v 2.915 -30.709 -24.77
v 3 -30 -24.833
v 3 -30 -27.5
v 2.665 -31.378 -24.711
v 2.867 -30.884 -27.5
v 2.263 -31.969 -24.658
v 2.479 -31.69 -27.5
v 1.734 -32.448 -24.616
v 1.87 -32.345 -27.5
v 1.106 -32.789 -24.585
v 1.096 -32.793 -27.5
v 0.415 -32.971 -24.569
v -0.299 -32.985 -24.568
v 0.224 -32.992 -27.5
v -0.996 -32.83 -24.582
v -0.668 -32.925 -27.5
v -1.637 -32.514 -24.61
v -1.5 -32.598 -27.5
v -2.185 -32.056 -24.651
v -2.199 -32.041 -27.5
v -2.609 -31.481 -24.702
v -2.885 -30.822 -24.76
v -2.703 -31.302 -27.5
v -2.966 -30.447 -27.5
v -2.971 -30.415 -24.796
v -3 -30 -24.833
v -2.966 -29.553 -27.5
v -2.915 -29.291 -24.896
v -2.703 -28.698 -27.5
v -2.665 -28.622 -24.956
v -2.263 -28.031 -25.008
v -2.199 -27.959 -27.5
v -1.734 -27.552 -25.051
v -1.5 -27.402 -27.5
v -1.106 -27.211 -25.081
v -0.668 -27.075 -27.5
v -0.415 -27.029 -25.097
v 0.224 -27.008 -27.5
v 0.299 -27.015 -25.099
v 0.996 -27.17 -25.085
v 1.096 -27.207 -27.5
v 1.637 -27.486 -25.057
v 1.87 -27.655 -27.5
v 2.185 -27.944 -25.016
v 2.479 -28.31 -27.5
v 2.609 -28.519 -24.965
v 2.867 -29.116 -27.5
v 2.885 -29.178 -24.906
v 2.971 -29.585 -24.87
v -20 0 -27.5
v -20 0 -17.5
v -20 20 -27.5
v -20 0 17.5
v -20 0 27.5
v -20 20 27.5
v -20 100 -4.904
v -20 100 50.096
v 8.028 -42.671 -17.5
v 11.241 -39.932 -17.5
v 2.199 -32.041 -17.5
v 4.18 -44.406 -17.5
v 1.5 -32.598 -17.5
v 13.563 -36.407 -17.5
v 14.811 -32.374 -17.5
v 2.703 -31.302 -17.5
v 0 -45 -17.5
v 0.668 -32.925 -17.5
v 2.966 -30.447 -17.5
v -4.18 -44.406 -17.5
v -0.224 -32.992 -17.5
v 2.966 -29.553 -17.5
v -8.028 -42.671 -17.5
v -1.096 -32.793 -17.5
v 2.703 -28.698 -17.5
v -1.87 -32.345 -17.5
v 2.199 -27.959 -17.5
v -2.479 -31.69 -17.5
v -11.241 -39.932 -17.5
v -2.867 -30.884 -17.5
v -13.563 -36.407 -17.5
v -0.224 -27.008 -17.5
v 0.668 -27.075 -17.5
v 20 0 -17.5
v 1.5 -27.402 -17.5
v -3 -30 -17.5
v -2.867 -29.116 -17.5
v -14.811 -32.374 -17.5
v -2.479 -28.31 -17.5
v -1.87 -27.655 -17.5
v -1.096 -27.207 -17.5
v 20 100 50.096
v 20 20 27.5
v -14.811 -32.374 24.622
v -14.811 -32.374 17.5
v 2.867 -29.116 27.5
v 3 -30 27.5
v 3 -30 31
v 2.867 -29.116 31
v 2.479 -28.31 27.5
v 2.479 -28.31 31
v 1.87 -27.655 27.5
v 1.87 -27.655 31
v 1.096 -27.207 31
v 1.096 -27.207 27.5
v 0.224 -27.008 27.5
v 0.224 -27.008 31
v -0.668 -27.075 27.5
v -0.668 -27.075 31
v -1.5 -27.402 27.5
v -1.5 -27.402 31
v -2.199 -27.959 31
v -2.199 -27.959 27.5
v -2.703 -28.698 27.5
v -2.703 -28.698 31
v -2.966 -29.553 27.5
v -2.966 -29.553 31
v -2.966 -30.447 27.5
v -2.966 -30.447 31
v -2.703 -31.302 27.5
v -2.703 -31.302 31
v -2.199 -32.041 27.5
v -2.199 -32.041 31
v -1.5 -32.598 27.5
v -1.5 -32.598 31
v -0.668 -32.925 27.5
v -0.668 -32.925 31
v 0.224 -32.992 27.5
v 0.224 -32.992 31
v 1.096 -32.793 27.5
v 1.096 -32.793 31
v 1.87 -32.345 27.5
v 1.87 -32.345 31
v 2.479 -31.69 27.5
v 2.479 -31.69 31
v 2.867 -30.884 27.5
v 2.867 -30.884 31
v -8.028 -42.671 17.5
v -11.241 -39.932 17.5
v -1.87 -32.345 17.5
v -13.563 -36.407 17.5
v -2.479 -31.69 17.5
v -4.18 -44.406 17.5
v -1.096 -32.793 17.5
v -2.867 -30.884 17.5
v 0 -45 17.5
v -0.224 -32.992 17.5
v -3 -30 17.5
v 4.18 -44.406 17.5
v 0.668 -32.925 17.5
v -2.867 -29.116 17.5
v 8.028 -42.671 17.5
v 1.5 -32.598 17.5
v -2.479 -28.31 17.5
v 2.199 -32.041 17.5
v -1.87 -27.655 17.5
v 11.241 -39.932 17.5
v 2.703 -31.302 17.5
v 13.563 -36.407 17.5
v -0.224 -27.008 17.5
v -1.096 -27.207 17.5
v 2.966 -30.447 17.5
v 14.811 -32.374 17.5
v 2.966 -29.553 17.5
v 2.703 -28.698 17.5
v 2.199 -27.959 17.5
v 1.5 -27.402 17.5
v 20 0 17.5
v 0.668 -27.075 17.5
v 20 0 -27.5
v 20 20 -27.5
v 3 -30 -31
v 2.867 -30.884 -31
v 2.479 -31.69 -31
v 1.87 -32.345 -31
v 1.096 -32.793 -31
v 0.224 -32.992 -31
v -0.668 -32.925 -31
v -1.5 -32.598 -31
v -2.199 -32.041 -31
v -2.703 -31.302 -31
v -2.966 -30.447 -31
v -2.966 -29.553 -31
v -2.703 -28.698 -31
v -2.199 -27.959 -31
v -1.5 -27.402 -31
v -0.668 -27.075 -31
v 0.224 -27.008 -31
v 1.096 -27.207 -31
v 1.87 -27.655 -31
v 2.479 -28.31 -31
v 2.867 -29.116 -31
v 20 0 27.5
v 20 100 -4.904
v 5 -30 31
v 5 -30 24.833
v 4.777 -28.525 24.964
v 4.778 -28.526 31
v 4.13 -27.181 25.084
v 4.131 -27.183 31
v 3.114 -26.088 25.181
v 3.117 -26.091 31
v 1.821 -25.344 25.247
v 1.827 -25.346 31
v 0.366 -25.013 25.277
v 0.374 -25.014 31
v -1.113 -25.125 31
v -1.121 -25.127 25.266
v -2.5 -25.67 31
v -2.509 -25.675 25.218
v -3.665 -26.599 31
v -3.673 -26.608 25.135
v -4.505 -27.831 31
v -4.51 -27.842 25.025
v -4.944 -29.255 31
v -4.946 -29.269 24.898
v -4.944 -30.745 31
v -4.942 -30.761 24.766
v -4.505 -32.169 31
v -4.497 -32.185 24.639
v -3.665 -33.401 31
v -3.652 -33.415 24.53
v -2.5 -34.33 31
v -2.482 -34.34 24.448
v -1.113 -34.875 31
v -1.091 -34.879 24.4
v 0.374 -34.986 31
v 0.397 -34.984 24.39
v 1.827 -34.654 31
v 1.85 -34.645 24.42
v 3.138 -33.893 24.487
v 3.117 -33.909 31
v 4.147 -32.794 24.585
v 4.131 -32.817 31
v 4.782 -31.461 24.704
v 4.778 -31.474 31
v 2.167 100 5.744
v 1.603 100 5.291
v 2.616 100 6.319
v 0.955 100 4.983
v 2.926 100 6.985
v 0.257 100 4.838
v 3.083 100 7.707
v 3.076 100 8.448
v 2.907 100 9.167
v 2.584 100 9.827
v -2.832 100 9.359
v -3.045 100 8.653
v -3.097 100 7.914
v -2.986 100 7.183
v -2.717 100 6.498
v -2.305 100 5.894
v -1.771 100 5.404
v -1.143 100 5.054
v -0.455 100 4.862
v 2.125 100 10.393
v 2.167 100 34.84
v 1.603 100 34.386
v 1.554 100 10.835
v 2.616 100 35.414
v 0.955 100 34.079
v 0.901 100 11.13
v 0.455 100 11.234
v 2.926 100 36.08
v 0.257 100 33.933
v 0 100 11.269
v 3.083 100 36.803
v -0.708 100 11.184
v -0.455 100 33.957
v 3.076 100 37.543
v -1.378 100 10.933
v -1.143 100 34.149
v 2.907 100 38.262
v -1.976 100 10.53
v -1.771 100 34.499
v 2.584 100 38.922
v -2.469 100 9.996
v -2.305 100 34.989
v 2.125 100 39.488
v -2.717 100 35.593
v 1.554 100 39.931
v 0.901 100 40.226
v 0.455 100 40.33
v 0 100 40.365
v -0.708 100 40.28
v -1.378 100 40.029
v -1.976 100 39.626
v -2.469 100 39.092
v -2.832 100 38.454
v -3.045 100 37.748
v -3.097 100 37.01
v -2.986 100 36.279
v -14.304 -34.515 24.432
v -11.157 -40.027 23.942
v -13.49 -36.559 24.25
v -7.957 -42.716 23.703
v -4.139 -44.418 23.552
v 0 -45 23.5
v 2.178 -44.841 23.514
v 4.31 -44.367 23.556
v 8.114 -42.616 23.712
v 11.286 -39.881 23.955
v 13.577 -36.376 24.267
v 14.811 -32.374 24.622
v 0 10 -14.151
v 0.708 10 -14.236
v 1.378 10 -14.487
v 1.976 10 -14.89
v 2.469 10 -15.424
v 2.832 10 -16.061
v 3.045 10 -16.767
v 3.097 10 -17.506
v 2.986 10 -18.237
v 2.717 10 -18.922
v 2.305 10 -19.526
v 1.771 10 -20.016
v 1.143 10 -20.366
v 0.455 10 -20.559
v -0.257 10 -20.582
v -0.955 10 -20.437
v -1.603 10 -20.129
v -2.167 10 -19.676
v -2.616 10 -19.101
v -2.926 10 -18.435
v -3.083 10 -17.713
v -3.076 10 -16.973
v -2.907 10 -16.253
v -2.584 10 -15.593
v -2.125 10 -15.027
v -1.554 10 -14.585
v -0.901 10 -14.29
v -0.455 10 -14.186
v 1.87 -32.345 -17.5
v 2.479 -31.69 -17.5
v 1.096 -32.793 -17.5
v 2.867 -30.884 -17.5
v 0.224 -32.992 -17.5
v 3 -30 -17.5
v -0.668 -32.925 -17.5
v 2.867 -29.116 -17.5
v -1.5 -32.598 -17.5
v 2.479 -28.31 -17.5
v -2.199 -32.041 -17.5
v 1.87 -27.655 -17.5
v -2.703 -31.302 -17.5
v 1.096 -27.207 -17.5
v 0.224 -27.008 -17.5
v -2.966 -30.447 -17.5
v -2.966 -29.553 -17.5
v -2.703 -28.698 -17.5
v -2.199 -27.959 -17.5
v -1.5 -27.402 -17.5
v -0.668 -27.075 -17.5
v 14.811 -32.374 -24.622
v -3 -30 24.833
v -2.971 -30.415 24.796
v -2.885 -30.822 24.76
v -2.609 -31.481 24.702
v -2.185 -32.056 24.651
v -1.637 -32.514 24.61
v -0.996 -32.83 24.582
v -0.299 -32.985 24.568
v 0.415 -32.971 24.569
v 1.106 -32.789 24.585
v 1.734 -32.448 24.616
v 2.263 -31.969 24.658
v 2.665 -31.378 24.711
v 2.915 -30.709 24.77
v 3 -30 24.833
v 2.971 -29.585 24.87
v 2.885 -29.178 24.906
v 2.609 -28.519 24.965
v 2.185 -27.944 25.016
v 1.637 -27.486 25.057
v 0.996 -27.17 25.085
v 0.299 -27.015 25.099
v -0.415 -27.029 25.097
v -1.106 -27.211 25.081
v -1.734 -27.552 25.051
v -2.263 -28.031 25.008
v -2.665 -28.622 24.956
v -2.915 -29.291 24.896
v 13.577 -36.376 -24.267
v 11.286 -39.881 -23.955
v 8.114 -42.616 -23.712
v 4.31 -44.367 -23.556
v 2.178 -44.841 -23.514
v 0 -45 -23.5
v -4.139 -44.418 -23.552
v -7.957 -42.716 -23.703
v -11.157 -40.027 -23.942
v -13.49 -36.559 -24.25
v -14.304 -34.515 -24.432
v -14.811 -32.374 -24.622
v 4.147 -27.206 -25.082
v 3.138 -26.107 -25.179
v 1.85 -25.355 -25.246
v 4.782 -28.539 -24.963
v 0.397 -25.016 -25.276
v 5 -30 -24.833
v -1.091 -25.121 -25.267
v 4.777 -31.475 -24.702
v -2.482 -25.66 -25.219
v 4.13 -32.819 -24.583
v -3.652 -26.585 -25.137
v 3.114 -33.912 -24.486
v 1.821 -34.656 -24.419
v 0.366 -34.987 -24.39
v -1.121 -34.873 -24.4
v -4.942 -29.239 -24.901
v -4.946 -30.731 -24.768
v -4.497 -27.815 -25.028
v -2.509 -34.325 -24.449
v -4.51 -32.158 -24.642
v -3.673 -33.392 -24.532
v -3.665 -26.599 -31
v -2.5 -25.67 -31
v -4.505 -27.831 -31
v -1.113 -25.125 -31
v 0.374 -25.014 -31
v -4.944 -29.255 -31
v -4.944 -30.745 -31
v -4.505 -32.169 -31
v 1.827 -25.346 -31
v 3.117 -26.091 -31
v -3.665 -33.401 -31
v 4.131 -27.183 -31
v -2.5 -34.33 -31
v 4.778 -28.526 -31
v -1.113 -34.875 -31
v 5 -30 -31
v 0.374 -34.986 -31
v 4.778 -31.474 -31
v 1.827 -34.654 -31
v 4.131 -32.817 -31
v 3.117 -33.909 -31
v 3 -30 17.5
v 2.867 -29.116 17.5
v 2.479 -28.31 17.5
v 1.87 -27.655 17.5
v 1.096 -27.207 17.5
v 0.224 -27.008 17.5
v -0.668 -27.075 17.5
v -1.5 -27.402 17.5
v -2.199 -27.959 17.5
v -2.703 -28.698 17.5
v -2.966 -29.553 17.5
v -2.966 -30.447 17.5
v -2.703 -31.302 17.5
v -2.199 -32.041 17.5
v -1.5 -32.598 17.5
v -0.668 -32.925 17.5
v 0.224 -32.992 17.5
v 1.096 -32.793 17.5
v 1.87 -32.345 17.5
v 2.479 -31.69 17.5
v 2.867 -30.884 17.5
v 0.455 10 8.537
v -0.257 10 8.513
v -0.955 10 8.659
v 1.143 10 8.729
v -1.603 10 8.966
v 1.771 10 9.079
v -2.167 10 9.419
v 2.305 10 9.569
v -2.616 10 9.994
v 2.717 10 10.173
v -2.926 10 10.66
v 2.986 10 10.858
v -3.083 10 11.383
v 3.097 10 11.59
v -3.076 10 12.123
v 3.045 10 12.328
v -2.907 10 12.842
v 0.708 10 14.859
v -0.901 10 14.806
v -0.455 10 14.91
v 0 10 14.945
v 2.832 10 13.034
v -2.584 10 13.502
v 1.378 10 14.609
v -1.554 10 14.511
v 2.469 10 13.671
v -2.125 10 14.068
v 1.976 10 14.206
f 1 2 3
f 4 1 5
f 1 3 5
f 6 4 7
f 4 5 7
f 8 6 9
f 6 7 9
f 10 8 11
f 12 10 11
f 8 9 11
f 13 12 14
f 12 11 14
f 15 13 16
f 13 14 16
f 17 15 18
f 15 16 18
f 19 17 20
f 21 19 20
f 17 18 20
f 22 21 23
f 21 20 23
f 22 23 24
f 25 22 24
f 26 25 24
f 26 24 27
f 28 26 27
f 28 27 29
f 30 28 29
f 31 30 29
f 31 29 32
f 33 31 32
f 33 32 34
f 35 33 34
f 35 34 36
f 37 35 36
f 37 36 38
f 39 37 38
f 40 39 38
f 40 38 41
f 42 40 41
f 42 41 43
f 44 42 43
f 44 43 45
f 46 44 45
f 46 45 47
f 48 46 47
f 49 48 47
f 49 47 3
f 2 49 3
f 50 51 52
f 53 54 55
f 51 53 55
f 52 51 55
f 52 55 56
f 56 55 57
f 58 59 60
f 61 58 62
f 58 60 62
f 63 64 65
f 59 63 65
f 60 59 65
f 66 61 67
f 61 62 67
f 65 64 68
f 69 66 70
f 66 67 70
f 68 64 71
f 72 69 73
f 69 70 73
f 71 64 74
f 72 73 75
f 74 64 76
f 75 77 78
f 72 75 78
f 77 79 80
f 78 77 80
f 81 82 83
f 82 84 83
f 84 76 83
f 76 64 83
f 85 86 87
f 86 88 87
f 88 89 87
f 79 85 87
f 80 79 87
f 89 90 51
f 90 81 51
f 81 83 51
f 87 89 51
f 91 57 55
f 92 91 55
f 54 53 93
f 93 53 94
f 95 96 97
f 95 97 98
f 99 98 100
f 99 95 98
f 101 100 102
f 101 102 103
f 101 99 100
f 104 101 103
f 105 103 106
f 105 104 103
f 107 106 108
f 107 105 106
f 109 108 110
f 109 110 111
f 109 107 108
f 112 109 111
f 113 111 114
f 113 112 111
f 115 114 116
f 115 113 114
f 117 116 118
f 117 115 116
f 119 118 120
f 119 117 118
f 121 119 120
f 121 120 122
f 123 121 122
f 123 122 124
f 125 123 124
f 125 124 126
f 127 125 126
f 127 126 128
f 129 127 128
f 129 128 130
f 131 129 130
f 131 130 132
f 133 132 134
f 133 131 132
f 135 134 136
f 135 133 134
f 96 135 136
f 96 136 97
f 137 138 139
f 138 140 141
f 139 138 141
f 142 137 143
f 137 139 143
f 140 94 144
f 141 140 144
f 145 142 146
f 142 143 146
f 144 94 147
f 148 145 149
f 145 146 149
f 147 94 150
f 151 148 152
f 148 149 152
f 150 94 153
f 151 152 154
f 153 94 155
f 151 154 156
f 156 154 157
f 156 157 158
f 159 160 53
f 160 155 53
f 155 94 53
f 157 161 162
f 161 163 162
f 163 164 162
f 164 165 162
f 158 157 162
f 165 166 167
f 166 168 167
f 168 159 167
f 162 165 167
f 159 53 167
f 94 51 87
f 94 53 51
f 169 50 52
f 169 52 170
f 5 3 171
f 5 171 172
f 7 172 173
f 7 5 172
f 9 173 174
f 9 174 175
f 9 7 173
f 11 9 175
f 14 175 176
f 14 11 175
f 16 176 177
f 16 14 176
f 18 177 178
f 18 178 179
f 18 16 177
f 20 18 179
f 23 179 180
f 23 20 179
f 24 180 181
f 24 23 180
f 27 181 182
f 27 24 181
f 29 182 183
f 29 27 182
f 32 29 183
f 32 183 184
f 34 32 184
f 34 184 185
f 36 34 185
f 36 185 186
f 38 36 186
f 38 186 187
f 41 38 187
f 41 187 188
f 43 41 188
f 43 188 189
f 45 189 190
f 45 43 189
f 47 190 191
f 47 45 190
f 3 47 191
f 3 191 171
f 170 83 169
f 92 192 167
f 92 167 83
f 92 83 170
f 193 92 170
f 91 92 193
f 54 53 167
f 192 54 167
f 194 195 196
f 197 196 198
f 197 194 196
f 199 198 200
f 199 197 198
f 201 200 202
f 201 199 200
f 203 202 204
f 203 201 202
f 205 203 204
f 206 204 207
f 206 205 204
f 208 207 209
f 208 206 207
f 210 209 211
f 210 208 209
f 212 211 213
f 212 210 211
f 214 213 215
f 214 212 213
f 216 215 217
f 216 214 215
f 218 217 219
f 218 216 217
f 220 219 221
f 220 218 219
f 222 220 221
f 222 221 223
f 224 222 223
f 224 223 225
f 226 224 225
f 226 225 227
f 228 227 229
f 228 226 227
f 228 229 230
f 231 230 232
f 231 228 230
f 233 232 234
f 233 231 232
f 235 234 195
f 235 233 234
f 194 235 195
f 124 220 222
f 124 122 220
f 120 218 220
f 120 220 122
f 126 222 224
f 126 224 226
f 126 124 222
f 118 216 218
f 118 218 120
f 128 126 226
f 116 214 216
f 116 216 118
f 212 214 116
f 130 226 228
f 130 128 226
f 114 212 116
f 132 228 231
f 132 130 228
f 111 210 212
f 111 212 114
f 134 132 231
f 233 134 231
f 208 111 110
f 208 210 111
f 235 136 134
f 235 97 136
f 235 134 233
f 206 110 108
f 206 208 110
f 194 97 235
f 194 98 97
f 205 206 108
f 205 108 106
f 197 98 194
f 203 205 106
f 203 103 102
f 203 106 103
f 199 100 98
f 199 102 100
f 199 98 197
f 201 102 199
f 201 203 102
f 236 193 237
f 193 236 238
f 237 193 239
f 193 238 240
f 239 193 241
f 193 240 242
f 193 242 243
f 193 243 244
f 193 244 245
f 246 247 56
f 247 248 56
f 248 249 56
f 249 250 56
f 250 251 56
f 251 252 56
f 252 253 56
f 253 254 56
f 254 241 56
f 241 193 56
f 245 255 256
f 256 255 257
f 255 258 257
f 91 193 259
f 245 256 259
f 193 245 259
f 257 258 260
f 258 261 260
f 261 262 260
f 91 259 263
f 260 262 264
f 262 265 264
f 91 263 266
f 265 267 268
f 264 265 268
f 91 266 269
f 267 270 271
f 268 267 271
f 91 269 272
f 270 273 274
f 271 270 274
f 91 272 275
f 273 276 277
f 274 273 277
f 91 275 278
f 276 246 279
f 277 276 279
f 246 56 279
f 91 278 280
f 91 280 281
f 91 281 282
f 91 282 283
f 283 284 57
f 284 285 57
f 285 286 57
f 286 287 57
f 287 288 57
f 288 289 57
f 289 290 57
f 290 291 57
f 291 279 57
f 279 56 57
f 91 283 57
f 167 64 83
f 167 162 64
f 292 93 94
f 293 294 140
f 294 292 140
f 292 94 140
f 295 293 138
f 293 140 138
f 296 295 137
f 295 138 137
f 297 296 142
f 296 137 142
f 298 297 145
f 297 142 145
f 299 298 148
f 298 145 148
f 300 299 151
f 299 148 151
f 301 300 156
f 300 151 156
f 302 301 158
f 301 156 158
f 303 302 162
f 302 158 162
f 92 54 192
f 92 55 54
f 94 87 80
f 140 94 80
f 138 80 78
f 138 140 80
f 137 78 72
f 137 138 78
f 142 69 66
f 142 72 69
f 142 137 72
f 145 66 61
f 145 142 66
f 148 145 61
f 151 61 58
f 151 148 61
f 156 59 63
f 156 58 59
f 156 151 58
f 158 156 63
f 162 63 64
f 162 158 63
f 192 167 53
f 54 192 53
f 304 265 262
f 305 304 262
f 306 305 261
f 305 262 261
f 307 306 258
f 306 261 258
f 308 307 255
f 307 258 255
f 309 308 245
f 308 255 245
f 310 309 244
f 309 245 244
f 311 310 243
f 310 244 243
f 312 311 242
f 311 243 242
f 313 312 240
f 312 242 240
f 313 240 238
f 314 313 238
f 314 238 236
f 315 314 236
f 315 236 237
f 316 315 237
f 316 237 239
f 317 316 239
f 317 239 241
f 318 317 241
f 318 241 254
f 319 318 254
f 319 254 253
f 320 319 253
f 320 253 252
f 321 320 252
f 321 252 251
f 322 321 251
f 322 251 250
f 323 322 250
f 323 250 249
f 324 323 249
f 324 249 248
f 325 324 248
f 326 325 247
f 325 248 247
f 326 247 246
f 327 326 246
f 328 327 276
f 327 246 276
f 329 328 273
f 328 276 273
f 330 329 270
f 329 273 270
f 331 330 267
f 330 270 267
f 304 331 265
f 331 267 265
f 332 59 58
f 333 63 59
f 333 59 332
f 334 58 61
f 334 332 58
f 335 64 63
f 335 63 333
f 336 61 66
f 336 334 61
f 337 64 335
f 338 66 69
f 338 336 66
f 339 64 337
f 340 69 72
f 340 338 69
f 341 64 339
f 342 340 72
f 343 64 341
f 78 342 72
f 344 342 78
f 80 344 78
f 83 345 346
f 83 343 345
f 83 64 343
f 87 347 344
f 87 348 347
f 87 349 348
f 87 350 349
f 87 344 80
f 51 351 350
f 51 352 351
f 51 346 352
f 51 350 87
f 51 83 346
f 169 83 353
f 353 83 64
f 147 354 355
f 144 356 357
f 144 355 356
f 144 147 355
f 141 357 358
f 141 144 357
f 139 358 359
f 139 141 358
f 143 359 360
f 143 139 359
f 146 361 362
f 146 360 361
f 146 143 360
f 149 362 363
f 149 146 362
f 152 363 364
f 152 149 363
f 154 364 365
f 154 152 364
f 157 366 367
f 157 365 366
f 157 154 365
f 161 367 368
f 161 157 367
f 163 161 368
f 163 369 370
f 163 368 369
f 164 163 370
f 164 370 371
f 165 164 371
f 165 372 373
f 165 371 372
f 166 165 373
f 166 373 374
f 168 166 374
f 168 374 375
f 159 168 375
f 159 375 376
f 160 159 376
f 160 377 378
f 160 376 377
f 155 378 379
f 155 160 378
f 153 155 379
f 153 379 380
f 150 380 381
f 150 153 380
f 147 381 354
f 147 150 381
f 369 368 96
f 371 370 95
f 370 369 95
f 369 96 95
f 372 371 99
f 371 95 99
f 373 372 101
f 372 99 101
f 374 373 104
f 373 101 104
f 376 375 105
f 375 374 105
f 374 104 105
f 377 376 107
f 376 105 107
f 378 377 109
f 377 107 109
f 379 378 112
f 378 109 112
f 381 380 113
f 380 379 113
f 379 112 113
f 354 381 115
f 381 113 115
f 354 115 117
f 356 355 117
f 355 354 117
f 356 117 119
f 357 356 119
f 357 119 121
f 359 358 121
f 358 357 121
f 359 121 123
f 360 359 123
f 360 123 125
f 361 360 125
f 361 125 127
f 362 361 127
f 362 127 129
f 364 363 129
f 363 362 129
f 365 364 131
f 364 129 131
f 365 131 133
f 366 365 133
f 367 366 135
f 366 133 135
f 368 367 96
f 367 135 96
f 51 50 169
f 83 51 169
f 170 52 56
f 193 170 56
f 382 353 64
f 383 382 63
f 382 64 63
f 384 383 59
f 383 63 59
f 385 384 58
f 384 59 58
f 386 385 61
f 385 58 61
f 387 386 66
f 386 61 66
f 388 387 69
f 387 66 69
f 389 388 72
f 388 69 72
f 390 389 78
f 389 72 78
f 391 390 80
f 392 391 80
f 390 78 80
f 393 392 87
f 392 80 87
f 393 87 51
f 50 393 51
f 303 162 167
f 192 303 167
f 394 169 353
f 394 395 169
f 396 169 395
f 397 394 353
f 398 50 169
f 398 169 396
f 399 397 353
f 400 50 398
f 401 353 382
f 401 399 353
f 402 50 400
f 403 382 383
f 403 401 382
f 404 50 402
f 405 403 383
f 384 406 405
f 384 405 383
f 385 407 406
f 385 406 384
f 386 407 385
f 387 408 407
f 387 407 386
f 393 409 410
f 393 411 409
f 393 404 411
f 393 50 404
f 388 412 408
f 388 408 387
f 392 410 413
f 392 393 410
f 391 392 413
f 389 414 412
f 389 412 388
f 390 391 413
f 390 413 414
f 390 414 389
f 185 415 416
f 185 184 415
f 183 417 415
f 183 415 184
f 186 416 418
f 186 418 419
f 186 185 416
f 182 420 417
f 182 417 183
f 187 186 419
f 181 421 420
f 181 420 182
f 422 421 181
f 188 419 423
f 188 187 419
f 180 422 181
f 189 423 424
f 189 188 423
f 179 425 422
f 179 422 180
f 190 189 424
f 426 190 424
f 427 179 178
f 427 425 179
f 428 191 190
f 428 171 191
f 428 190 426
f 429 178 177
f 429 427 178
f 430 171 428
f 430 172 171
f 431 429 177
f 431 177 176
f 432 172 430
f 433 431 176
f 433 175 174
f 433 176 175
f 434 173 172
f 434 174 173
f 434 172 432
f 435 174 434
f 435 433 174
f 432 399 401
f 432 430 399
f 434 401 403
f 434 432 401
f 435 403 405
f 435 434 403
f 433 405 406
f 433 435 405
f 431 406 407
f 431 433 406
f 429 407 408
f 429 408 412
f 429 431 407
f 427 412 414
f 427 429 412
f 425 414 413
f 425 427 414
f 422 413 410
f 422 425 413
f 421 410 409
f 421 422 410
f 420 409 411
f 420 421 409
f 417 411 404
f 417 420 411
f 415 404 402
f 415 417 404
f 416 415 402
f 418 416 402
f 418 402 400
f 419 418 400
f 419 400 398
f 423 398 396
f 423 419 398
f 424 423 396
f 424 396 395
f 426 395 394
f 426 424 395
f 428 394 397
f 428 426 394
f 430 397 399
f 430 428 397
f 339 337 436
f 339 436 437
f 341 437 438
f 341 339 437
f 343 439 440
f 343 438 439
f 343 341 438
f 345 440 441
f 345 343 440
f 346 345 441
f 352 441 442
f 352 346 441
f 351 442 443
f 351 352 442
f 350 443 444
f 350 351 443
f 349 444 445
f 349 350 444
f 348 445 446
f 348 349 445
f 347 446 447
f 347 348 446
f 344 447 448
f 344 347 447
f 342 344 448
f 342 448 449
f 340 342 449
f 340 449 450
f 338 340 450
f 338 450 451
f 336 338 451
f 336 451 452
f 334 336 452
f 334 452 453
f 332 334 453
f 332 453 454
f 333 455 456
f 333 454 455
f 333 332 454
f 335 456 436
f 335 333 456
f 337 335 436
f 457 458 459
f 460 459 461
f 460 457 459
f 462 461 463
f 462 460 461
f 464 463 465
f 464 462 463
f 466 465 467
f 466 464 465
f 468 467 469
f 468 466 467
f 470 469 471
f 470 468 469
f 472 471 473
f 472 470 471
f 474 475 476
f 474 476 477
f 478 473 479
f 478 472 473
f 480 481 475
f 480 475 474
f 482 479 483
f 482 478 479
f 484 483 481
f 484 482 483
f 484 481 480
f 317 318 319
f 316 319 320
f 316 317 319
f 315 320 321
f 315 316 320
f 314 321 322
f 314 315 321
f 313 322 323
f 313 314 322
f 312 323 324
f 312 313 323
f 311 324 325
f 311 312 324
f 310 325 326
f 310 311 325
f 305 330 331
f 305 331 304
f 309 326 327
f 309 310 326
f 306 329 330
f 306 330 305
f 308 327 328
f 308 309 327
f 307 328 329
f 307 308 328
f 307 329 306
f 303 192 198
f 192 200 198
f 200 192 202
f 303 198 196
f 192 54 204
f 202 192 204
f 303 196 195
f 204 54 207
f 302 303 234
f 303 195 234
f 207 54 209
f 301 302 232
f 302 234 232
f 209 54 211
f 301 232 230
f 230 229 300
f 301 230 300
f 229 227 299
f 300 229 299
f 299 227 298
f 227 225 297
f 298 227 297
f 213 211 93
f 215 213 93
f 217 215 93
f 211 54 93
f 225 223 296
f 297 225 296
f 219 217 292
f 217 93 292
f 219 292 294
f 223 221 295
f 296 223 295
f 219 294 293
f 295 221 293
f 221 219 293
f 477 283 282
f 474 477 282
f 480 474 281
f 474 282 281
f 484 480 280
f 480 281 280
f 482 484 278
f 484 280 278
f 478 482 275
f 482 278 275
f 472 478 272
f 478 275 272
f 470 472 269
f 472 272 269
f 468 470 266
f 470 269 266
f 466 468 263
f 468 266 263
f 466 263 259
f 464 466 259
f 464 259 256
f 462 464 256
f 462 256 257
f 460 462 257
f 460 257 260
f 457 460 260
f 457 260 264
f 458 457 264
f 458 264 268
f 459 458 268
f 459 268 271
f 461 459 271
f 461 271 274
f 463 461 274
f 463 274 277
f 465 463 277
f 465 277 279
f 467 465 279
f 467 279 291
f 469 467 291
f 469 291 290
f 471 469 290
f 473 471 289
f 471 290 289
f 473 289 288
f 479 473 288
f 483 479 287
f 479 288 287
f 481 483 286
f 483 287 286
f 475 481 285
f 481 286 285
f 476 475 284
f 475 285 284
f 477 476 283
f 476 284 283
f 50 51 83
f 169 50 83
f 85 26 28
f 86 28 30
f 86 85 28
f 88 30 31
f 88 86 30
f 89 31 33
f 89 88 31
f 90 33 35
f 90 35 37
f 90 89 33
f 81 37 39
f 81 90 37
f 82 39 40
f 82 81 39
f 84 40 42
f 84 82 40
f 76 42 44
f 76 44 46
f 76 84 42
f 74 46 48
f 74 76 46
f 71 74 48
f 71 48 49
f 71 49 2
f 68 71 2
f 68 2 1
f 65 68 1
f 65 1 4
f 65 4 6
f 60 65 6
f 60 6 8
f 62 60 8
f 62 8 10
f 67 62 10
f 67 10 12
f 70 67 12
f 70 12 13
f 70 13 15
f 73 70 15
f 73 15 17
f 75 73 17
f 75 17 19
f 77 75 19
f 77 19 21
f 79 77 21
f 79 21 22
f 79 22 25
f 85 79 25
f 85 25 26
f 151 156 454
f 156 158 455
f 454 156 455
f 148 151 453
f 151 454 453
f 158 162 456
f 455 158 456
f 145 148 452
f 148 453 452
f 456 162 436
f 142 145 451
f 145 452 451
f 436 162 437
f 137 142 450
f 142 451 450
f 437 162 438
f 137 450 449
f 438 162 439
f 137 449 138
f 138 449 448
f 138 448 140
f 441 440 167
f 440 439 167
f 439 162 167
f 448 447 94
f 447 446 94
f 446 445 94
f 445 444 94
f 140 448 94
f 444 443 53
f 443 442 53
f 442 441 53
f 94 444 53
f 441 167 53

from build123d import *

# Parameters (mm, degrees)
CROQUIS1_W                          = 40
CROQUIS1_H                          = 55
SALIENTE_EXTRUIR1_DEPTH             = 20
SALIENTE_EXTRUIR2_REACH             = 41.449
SALIENTE_EXTRUIR2_DIRECTION_2_REACH = 41.449
CORTAR_EXTRUIR6_DEPTH               = 57.402570863
CORTAR_EXTRUIR6_DEPTH_BACK          = 57.402570863
CROQUIS6_R                          = 3
CORTAR_EXTRUIR10_DEPTH              = 10
CROQUIS11_R                         = 3
SALIENTE_EXTRUIR3_DEPTH             = 10
CORTAR_EXTRUIR11_DEPTH              = 57.402570863
CORTAR_EXTRUIR11_DEPTH_BACK         = 57.402570863
CORTAR_EXTRUIR15_START              = -10
CORTAR_EXTRUIR15_DEPTH              = 10
CROQUIS17_R                         = 3
SALIENTE_EXTRUIR4_DEPTH             = 10
CORTAR_EXTRUIR16_DEPTH              = 57.402570863
CORTAR_EXTRUIR16_DEPTH_BACK         = 57.402570863
CROQUIS21_R                         = 5
CROQUIS21_R_2                       = 3
SALIENTE_EXTRUIR5_DEPTH             = 3.5
SALIENTE_EXTRUIR5_DIRECTION_2_REACH = 75.824
CROQUIS22_R                         = 5
CROQUIS22_R_2                       = 3
SALIENTE_EXTRUIR6_DEPTH             = 3.5
SALIENTE_EXTRUIR6_DIRECTION_2_REACH = 78.467
BARRER1_START                       = -20
BARRER1_DEPTH                       = 40
CORTAR_EXTRUIR20_REACH              = 165.765
CROQUIS25_R                         = 3.1


# Read off the part's stored shape, not the designer's step: Barrer1
with BuildPart() as part:
    # Croquis1 → Saliente-Extruir1 (new body)
    with BuildSketch(Plane(origin=(0, 0, 0), x_dir=(1, 0, 0), z_dir=(0, 1, 0))):
        Rectangle(CROQUIS1_W, CROQUIS1_H)
    extrude(amount=SALIENTE_EXTRUIR1_DEPTH)

    # Saliente-Extruir2: up to this face of the body (flat: up to its plane)
    saliente_extruir2_end = Plane(part.part.faces().sort_by_distance((0, 10, 27.5))[0])
    # Croquis5 → Saliente-Extruir2 (add, up to the picked face)
    with BuildSketch(Plane.XY, mode=Mode.PRIVATE) as saliente_extruir2_sk1:
        with BuildLine():
            Line((-20, 0), (-14.810951292, -32.373967528))
            ThreePointArc((-14.810951292, -32.373967528), (0, -45), (14.810951292, -32.373967528))
            Line((14.810951292, -32.373967528), (20, 0))
            Line((20, 0), (-20, 0))
        make_face()
    saliente_extruir2_tool1 = split(extrude(saliente_extruir2_sk1.sketch, amount=SALIENTE_EXTRUIR2_REACH, mode=Mode.PRIVATE), bisect_by=saliente_extruir2_end, keep=Keep.BOTH, mode=Mode.PRIVATE)
    add(saliente_extruir2_tool1.solids().sort_by(Axis((0, -19.849245, 0), (0, 0, 1)))[0])

    # Saliente-Extruir2 direction 2: up to this face of the body (flat: up to its plane)
    saliente_extruir2_direction_2_end = Plane(part.part.faces().sort_by_distance((0, 10, -27.5))[0])
    # Croquis5 → Saliente-Extruir2 direction 2 (add, up to the picked face)
    with BuildSketch(Plane.XY, mode=Mode.PRIVATE) as saliente_extruir2_direction_2_sk1:
        with BuildLine():
            Line((-20, 0), (-14.810951292, -32.373967528))
            ThreePointArc((-14.810951292, -32.373967528), (0, -45), (14.810951292, -32.373967528))
            Line((14.810951292, -32.373967528), (20, 0))
            Line((20, 0), (-20, 0))
        make_face()
    saliente_extruir2_direction_2_tool1 = split(extrude(saliente_extruir2_direction_2_sk1.sketch, amount=-SALIENTE_EXTRUIR2_DIRECTION_2_REACH, mode=Mode.PRIVATE), bisect_by=saliente_extruir2_direction_2_end, keep=Keep.BOTH, mode=Mode.PRIVATE)
    add(saliente_extruir2_direction_2_tool1.solids().sort_by(Axis((0, -19.849245, 0), (0, 0, -1)))[0])

    # Croquis6 → Cortar-Extruir6 (cut, two sides: drawn at the far end of the back side and taken through both)
    with BuildSketch(Plane.XY.offset(-CORTAR_EXTRUIR6_DEPTH_BACK)):
        with Locations((0, -30)):
            Circle(CROQUIS6_R)
    extrude(amount=CORTAR_EXTRUIR6_DEPTH + CORTAR_EXTRUIR6_DEPTH_BACK, mode=Mode.SUBTRACT)

    # Croquis10 → Cortar-Extruir10 (cut)
    with BuildSketch(Plane(origin=(0, 0, -27.5), x_dir=(-1, 0, 0), z_dir=(0, 0, -1))):
        with BuildLine():
            Line((14.810951292, -32.373967528), (20, 0))
            Line((20, 0), (-20, 0))
            Line((-20, 0), (-14.810951292, -32.373967528))
            ThreePointArc((-14.810951292, -32.373967528), (0, -45), (14.810951292, -32.373967528))
        make_face()
    extrude(amount=-CORTAR_EXTRUIR10_DEPTH, mode=Mode.SUBTRACT)

    # Croquis16 → Cortar-Extruir15 (cut)
    with BuildSketch(Plane.XY.offset(27.5).offset(CORTAR_EXTRUIR15_START)):
        with BuildLine():
            Line((-20, 0), (20, 0))
            Line((20, 0), (14.810951292, -32.373967528))
            ThreePointArc((14.810951292, -32.373967528), (0, -45), (-14.810951292, -32.373967528))
            Line((-14.810951292, -32.373967528), (-20, 0))
        make_face()
    extrude(amount=CORTAR_EXTRUIR15_DEPTH, mode=Mode.SUBTRACT)

    # Barrer1 outline → Barrer1 (add)
    with BuildSketch(Plane.YZ.offset(BARRER1_START)):
        Polygon((20, -27.5), (100, -4.904361816), (100, 50.095638184), (20, 27.5), align=None)
    extrude(amount=BARRER1_DEPTH)

    # Cortar-Extruir20: up to this plane
    cortar_extruir20_end = Plane(origin=(0, 10, 0), z_dir=(0, 1, 0))
    # Croquis25 → Cortar-Extruir20 (cut, up to the surface)
    with BuildSketch(Plane(origin=(0, 105.715764038, 29.858939432), x_dir=(1, 0, 0), z_dir=(0, 0.9623504992532018, 0.27181154608867053)), mode=Mode.PRIVATE) as cortar_extruir20_sk1:
        with Locations(Location((0, 19.436230922, 0), (0, 0, 270))):
            Circle(CROQUIS25_R)
    cortar_extruir20_tool1 = split(extrude(cortar_extruir20_sk1.sketch, amount=-CORTAR_EXTRUIR20_REACH, mode=Mode.PRIVATE), bisect_by=cortar_extruir20_end, keep=Keep.BOTH, mode=Mode.PRIVATE)
    add(cortar_extruir20_tool1.solids().sort_by_distance((0, 110.998756, 11.154473))[0], mode=Mode.SUBTRACT)
    # Croquis25 → Cortar-Extruir20 (cut, up to the surface)
    with BuildSketch(Plane(origin=(0, 105.715764038, 29.858939432), x_dir=(1, 0, 0), z_dir=(0, 0.9623504992532018, 0.27181154608867053)), mode=Mode.PRIVATE) as cortar_extruir20_sk2:
        with Locations(Location((0, -8.563769078, 0), (0, 0, 270))):
            Circle(CROQUIS25_R)
    cortar_extruir20_tool2 = split(extrude(cortar_extruir20_sk2.sketch, amount=-CORTAR_EXTRUIR20_REACH, mode=Mode.PRIVATE), bisect_by=cortar_extruir20_end, keep=Keep.BOTH, mode=Mode.PRIVATE)
    add(cortar_extruir20_tool2.solids().sort_by_distance((0, 103.388033, 38.100287))[0], mode=Mode.SUBTRACT)


with BuildPart() as body_2:
    # Croquis11 → Saliente-Extruir3 (new body)
    with BuildSketch(Plane(origin=(0, 0, -17.5), x_dir=(-1, 0, 0), z_dir=(0, 0, -1))):
        with BuildLine():
            Line((20, 0), (-20, 0))
            Line((-20, 0), (-14.810951292, -32.373967528))
            ThreePointArc((-14.810951292, -32.373967528), (0, -45), (14.810951292, -32.373967528))
            Line((14.810951292, -32.373967528), (20, 0))
        make_face()
        with Locations((0, -30)):
            Circle(CROQUIS11_R, mode=Mode.SUBTRACT)
    extrude(amount=SALIENTE_EXTRUIR3_DEPTH)

    # Croquis12 → Cortar-Extruir11 (cut, two sides: drawn at the far end of the back side and taken through both)
    with BuildSketch(Plane(origin=(0, 0, 0), x_dir=(0, 0, -1), z_dir=(1, 0, 0)).offset(-CORTAR_EXTRUIR11_DEPTH_BACK)):
        with BuildLine():
            Line((27.5, 0), (23.5, -45))
            add(Edge.make_bspline(
                [(23.5, -45), (53.895048744, -65.691423054), (27.5, 0)],
                knots=[0, 0, 0, 1, 1, 1], degree=2))
        make_face()
    extrude(amount=CORTAR_EXTRUIR11_DEPTH + CORTAR_EXTRUIR11_DEPTH_BACK, mode=Mode.SUBTRACT)

    # Croquis22 → Saliente-Extruir6 (add)
    with BuildSketch(Plane(origin=(0, 0, -27.5), x_dir=(-1, 0, 0), z_dir=(0, 0, -1))):
        with Locations(Location((0, -30, 0), (0, 0, 180))):
            Circle(CROQUIS22_R)
        with Locations(Location((0, -30, 0), (0, 0, 180))):
            Circle(CROQUIS22_R_2, mode=Mode.SUBTRACT)
    extrude(amount=SALIENTE_EXTRUIR6_DEPTH)

    # Saliente-Extruir6 direction 2: up to this face of the body (flat: up to its plane)
    saliente_extruir6_direction_2_end = Plane(body_2.part.faces().sort_by_distance((0, -19.641450964, -25.754093248))[0])
    # Croquis22 → Saliente-Extruir6 direction 2 (add, up to the picked face)
    with BuildSketch(Plane(origin=(0, 0, -27.5), x_dir=(-1, 0, 0), z_dir=(0, 0, -1)), mode=Mode.PRIVATE) as saliente_extruir6_direction_2_sk1:
        with Locations(Location((0, -30, 0), (0, 0, 180))):
            Circle(CROQUIS22_R)
        with Locations(Location((0, -30, 0), (0, 0, 180))):
            Circle(CROQUIS22_R_2, mode=Mode.SUBTRACT)
    saliente_extruir6_direction_2_tool1 = split(extrude(saliente_extruir6_direction_2_sk1.sketch, amount=-SALIENTE_EXTRUIR6_DIRECTION_2_REACH, mode=Mode.PRIVATE), bisect_by=saliente_extruir6_direction_2_end, keep=Keep.BOTH, mode=Mode.PRIVATE)
    add(saliente_extruir6_direction_2_tool1.solids().sort_by(Axis((-4.858579, -30, -27.5), (0, 0, 1)))[0])


with BuildPart() as body_3:
    # Croquis17 → Saliente-Extruir4 (new body)
    with BuildSketch(Plane.XY.offset(17.5)):
        with BuildLine():
            Line((14.810951292, -32.373967528), (20, 0))
            Line((20, 0), (-20, 0))
            Line((-20, 0), (-14.810951292, -32.373967528))
            ThreePointArc((-14.810951292, -32.373967528), (0, -45), (14.810951292, -32.373967528))
        make_face()
        with Locations(Location((0, -30, 0), (0, 0, 180))):
            Circle(CROQUIS17_R, mode=Mode.SUBTRACT)
    extrude(amount=SALIENTE_EXTRUIR4_DEPTH)

    # Croquis18 → Cortar-Extruir16 (cut, two sides: drawn at the far end of the back side and taken through both)
    with BuildSketch(Plane(origin=(0, 0, 0), x_dir=(0, 0, -1), z_dir=(1, 0, 0)).offset(-CORTAR_EXTRUIR16_DEPTH_BACK)):
        with BuildLine():
            Line((-27.5, 0), (-23.5, -45))
            add(Edge.make_bspline(
                [(-23.5, -45), (-50.99373039, -70.964066745), (-27.5, 0)],
                knots=[0, 0, 0, 1, 1, 1], degree=2))
        make_face()
    extrude(amount=CORTAR_EXTRUIR16_DEPTH + CORTAR_EXTRUIR16_DEPTH_BACK, mode=Mode.SUBTRACT)

    # Croquis21 → Saliente-Extruir5 (add)
    with BuildSketch(Plane.XY.offset(27.5)):
        with Locations((0, -30)):
            Circle(CROQUIS21_R)
        with Locations((0, -30)):
            Circle(CROQUIS21_R_2, mode=Mode.SUBTRACT)
    extrude(amount=SALIENTE_EXTRUIR5_DEPTH)

    # Saliente-Extruir5 direction 2: up to this face of the body (flat: up to its plane)
    saliente_extruir5_direction_2_end = Plane(body_3.part.faces().sort_by_distance((0, -19.641450964, 25.754093248))[0])
    # Croquis21 → Saliente-Extruir5 direction 2 (add, up to the picked face)
    with BuildSketch(Plane.XY.offset(27.5), mode=Mode.PRIVATE) as saliente_extruir5_direction_2_sk1:
        with Locations((0, -30)):
            Circle(CROQUIS21_R)
        with Locations((0, -30)):
            Circle(CROQUIS21_R_2, mode=Mode.SUBTRACT)
    saliente_extruir5_direction_2_tool1 = split(extrude(saliente_extruir5_direction_2_sk1.sketch, amount=-SALIENTE_EXTRUIR5_DIRECTION_2_REACH, mode=Mode.PRIVATE), bisect_by=saliente_extruir5_direction_2_end, keep=Keep.BOTH, mode=Mode.PRIVATE)
    add(saliente_extruir5_direction_2_tool1.solids().sort_by(Axis((-4.858579, -30, 27.5), (0, 0, -1)))[0])


solid = Compound([part.part, body_2.part, body_3.part])
